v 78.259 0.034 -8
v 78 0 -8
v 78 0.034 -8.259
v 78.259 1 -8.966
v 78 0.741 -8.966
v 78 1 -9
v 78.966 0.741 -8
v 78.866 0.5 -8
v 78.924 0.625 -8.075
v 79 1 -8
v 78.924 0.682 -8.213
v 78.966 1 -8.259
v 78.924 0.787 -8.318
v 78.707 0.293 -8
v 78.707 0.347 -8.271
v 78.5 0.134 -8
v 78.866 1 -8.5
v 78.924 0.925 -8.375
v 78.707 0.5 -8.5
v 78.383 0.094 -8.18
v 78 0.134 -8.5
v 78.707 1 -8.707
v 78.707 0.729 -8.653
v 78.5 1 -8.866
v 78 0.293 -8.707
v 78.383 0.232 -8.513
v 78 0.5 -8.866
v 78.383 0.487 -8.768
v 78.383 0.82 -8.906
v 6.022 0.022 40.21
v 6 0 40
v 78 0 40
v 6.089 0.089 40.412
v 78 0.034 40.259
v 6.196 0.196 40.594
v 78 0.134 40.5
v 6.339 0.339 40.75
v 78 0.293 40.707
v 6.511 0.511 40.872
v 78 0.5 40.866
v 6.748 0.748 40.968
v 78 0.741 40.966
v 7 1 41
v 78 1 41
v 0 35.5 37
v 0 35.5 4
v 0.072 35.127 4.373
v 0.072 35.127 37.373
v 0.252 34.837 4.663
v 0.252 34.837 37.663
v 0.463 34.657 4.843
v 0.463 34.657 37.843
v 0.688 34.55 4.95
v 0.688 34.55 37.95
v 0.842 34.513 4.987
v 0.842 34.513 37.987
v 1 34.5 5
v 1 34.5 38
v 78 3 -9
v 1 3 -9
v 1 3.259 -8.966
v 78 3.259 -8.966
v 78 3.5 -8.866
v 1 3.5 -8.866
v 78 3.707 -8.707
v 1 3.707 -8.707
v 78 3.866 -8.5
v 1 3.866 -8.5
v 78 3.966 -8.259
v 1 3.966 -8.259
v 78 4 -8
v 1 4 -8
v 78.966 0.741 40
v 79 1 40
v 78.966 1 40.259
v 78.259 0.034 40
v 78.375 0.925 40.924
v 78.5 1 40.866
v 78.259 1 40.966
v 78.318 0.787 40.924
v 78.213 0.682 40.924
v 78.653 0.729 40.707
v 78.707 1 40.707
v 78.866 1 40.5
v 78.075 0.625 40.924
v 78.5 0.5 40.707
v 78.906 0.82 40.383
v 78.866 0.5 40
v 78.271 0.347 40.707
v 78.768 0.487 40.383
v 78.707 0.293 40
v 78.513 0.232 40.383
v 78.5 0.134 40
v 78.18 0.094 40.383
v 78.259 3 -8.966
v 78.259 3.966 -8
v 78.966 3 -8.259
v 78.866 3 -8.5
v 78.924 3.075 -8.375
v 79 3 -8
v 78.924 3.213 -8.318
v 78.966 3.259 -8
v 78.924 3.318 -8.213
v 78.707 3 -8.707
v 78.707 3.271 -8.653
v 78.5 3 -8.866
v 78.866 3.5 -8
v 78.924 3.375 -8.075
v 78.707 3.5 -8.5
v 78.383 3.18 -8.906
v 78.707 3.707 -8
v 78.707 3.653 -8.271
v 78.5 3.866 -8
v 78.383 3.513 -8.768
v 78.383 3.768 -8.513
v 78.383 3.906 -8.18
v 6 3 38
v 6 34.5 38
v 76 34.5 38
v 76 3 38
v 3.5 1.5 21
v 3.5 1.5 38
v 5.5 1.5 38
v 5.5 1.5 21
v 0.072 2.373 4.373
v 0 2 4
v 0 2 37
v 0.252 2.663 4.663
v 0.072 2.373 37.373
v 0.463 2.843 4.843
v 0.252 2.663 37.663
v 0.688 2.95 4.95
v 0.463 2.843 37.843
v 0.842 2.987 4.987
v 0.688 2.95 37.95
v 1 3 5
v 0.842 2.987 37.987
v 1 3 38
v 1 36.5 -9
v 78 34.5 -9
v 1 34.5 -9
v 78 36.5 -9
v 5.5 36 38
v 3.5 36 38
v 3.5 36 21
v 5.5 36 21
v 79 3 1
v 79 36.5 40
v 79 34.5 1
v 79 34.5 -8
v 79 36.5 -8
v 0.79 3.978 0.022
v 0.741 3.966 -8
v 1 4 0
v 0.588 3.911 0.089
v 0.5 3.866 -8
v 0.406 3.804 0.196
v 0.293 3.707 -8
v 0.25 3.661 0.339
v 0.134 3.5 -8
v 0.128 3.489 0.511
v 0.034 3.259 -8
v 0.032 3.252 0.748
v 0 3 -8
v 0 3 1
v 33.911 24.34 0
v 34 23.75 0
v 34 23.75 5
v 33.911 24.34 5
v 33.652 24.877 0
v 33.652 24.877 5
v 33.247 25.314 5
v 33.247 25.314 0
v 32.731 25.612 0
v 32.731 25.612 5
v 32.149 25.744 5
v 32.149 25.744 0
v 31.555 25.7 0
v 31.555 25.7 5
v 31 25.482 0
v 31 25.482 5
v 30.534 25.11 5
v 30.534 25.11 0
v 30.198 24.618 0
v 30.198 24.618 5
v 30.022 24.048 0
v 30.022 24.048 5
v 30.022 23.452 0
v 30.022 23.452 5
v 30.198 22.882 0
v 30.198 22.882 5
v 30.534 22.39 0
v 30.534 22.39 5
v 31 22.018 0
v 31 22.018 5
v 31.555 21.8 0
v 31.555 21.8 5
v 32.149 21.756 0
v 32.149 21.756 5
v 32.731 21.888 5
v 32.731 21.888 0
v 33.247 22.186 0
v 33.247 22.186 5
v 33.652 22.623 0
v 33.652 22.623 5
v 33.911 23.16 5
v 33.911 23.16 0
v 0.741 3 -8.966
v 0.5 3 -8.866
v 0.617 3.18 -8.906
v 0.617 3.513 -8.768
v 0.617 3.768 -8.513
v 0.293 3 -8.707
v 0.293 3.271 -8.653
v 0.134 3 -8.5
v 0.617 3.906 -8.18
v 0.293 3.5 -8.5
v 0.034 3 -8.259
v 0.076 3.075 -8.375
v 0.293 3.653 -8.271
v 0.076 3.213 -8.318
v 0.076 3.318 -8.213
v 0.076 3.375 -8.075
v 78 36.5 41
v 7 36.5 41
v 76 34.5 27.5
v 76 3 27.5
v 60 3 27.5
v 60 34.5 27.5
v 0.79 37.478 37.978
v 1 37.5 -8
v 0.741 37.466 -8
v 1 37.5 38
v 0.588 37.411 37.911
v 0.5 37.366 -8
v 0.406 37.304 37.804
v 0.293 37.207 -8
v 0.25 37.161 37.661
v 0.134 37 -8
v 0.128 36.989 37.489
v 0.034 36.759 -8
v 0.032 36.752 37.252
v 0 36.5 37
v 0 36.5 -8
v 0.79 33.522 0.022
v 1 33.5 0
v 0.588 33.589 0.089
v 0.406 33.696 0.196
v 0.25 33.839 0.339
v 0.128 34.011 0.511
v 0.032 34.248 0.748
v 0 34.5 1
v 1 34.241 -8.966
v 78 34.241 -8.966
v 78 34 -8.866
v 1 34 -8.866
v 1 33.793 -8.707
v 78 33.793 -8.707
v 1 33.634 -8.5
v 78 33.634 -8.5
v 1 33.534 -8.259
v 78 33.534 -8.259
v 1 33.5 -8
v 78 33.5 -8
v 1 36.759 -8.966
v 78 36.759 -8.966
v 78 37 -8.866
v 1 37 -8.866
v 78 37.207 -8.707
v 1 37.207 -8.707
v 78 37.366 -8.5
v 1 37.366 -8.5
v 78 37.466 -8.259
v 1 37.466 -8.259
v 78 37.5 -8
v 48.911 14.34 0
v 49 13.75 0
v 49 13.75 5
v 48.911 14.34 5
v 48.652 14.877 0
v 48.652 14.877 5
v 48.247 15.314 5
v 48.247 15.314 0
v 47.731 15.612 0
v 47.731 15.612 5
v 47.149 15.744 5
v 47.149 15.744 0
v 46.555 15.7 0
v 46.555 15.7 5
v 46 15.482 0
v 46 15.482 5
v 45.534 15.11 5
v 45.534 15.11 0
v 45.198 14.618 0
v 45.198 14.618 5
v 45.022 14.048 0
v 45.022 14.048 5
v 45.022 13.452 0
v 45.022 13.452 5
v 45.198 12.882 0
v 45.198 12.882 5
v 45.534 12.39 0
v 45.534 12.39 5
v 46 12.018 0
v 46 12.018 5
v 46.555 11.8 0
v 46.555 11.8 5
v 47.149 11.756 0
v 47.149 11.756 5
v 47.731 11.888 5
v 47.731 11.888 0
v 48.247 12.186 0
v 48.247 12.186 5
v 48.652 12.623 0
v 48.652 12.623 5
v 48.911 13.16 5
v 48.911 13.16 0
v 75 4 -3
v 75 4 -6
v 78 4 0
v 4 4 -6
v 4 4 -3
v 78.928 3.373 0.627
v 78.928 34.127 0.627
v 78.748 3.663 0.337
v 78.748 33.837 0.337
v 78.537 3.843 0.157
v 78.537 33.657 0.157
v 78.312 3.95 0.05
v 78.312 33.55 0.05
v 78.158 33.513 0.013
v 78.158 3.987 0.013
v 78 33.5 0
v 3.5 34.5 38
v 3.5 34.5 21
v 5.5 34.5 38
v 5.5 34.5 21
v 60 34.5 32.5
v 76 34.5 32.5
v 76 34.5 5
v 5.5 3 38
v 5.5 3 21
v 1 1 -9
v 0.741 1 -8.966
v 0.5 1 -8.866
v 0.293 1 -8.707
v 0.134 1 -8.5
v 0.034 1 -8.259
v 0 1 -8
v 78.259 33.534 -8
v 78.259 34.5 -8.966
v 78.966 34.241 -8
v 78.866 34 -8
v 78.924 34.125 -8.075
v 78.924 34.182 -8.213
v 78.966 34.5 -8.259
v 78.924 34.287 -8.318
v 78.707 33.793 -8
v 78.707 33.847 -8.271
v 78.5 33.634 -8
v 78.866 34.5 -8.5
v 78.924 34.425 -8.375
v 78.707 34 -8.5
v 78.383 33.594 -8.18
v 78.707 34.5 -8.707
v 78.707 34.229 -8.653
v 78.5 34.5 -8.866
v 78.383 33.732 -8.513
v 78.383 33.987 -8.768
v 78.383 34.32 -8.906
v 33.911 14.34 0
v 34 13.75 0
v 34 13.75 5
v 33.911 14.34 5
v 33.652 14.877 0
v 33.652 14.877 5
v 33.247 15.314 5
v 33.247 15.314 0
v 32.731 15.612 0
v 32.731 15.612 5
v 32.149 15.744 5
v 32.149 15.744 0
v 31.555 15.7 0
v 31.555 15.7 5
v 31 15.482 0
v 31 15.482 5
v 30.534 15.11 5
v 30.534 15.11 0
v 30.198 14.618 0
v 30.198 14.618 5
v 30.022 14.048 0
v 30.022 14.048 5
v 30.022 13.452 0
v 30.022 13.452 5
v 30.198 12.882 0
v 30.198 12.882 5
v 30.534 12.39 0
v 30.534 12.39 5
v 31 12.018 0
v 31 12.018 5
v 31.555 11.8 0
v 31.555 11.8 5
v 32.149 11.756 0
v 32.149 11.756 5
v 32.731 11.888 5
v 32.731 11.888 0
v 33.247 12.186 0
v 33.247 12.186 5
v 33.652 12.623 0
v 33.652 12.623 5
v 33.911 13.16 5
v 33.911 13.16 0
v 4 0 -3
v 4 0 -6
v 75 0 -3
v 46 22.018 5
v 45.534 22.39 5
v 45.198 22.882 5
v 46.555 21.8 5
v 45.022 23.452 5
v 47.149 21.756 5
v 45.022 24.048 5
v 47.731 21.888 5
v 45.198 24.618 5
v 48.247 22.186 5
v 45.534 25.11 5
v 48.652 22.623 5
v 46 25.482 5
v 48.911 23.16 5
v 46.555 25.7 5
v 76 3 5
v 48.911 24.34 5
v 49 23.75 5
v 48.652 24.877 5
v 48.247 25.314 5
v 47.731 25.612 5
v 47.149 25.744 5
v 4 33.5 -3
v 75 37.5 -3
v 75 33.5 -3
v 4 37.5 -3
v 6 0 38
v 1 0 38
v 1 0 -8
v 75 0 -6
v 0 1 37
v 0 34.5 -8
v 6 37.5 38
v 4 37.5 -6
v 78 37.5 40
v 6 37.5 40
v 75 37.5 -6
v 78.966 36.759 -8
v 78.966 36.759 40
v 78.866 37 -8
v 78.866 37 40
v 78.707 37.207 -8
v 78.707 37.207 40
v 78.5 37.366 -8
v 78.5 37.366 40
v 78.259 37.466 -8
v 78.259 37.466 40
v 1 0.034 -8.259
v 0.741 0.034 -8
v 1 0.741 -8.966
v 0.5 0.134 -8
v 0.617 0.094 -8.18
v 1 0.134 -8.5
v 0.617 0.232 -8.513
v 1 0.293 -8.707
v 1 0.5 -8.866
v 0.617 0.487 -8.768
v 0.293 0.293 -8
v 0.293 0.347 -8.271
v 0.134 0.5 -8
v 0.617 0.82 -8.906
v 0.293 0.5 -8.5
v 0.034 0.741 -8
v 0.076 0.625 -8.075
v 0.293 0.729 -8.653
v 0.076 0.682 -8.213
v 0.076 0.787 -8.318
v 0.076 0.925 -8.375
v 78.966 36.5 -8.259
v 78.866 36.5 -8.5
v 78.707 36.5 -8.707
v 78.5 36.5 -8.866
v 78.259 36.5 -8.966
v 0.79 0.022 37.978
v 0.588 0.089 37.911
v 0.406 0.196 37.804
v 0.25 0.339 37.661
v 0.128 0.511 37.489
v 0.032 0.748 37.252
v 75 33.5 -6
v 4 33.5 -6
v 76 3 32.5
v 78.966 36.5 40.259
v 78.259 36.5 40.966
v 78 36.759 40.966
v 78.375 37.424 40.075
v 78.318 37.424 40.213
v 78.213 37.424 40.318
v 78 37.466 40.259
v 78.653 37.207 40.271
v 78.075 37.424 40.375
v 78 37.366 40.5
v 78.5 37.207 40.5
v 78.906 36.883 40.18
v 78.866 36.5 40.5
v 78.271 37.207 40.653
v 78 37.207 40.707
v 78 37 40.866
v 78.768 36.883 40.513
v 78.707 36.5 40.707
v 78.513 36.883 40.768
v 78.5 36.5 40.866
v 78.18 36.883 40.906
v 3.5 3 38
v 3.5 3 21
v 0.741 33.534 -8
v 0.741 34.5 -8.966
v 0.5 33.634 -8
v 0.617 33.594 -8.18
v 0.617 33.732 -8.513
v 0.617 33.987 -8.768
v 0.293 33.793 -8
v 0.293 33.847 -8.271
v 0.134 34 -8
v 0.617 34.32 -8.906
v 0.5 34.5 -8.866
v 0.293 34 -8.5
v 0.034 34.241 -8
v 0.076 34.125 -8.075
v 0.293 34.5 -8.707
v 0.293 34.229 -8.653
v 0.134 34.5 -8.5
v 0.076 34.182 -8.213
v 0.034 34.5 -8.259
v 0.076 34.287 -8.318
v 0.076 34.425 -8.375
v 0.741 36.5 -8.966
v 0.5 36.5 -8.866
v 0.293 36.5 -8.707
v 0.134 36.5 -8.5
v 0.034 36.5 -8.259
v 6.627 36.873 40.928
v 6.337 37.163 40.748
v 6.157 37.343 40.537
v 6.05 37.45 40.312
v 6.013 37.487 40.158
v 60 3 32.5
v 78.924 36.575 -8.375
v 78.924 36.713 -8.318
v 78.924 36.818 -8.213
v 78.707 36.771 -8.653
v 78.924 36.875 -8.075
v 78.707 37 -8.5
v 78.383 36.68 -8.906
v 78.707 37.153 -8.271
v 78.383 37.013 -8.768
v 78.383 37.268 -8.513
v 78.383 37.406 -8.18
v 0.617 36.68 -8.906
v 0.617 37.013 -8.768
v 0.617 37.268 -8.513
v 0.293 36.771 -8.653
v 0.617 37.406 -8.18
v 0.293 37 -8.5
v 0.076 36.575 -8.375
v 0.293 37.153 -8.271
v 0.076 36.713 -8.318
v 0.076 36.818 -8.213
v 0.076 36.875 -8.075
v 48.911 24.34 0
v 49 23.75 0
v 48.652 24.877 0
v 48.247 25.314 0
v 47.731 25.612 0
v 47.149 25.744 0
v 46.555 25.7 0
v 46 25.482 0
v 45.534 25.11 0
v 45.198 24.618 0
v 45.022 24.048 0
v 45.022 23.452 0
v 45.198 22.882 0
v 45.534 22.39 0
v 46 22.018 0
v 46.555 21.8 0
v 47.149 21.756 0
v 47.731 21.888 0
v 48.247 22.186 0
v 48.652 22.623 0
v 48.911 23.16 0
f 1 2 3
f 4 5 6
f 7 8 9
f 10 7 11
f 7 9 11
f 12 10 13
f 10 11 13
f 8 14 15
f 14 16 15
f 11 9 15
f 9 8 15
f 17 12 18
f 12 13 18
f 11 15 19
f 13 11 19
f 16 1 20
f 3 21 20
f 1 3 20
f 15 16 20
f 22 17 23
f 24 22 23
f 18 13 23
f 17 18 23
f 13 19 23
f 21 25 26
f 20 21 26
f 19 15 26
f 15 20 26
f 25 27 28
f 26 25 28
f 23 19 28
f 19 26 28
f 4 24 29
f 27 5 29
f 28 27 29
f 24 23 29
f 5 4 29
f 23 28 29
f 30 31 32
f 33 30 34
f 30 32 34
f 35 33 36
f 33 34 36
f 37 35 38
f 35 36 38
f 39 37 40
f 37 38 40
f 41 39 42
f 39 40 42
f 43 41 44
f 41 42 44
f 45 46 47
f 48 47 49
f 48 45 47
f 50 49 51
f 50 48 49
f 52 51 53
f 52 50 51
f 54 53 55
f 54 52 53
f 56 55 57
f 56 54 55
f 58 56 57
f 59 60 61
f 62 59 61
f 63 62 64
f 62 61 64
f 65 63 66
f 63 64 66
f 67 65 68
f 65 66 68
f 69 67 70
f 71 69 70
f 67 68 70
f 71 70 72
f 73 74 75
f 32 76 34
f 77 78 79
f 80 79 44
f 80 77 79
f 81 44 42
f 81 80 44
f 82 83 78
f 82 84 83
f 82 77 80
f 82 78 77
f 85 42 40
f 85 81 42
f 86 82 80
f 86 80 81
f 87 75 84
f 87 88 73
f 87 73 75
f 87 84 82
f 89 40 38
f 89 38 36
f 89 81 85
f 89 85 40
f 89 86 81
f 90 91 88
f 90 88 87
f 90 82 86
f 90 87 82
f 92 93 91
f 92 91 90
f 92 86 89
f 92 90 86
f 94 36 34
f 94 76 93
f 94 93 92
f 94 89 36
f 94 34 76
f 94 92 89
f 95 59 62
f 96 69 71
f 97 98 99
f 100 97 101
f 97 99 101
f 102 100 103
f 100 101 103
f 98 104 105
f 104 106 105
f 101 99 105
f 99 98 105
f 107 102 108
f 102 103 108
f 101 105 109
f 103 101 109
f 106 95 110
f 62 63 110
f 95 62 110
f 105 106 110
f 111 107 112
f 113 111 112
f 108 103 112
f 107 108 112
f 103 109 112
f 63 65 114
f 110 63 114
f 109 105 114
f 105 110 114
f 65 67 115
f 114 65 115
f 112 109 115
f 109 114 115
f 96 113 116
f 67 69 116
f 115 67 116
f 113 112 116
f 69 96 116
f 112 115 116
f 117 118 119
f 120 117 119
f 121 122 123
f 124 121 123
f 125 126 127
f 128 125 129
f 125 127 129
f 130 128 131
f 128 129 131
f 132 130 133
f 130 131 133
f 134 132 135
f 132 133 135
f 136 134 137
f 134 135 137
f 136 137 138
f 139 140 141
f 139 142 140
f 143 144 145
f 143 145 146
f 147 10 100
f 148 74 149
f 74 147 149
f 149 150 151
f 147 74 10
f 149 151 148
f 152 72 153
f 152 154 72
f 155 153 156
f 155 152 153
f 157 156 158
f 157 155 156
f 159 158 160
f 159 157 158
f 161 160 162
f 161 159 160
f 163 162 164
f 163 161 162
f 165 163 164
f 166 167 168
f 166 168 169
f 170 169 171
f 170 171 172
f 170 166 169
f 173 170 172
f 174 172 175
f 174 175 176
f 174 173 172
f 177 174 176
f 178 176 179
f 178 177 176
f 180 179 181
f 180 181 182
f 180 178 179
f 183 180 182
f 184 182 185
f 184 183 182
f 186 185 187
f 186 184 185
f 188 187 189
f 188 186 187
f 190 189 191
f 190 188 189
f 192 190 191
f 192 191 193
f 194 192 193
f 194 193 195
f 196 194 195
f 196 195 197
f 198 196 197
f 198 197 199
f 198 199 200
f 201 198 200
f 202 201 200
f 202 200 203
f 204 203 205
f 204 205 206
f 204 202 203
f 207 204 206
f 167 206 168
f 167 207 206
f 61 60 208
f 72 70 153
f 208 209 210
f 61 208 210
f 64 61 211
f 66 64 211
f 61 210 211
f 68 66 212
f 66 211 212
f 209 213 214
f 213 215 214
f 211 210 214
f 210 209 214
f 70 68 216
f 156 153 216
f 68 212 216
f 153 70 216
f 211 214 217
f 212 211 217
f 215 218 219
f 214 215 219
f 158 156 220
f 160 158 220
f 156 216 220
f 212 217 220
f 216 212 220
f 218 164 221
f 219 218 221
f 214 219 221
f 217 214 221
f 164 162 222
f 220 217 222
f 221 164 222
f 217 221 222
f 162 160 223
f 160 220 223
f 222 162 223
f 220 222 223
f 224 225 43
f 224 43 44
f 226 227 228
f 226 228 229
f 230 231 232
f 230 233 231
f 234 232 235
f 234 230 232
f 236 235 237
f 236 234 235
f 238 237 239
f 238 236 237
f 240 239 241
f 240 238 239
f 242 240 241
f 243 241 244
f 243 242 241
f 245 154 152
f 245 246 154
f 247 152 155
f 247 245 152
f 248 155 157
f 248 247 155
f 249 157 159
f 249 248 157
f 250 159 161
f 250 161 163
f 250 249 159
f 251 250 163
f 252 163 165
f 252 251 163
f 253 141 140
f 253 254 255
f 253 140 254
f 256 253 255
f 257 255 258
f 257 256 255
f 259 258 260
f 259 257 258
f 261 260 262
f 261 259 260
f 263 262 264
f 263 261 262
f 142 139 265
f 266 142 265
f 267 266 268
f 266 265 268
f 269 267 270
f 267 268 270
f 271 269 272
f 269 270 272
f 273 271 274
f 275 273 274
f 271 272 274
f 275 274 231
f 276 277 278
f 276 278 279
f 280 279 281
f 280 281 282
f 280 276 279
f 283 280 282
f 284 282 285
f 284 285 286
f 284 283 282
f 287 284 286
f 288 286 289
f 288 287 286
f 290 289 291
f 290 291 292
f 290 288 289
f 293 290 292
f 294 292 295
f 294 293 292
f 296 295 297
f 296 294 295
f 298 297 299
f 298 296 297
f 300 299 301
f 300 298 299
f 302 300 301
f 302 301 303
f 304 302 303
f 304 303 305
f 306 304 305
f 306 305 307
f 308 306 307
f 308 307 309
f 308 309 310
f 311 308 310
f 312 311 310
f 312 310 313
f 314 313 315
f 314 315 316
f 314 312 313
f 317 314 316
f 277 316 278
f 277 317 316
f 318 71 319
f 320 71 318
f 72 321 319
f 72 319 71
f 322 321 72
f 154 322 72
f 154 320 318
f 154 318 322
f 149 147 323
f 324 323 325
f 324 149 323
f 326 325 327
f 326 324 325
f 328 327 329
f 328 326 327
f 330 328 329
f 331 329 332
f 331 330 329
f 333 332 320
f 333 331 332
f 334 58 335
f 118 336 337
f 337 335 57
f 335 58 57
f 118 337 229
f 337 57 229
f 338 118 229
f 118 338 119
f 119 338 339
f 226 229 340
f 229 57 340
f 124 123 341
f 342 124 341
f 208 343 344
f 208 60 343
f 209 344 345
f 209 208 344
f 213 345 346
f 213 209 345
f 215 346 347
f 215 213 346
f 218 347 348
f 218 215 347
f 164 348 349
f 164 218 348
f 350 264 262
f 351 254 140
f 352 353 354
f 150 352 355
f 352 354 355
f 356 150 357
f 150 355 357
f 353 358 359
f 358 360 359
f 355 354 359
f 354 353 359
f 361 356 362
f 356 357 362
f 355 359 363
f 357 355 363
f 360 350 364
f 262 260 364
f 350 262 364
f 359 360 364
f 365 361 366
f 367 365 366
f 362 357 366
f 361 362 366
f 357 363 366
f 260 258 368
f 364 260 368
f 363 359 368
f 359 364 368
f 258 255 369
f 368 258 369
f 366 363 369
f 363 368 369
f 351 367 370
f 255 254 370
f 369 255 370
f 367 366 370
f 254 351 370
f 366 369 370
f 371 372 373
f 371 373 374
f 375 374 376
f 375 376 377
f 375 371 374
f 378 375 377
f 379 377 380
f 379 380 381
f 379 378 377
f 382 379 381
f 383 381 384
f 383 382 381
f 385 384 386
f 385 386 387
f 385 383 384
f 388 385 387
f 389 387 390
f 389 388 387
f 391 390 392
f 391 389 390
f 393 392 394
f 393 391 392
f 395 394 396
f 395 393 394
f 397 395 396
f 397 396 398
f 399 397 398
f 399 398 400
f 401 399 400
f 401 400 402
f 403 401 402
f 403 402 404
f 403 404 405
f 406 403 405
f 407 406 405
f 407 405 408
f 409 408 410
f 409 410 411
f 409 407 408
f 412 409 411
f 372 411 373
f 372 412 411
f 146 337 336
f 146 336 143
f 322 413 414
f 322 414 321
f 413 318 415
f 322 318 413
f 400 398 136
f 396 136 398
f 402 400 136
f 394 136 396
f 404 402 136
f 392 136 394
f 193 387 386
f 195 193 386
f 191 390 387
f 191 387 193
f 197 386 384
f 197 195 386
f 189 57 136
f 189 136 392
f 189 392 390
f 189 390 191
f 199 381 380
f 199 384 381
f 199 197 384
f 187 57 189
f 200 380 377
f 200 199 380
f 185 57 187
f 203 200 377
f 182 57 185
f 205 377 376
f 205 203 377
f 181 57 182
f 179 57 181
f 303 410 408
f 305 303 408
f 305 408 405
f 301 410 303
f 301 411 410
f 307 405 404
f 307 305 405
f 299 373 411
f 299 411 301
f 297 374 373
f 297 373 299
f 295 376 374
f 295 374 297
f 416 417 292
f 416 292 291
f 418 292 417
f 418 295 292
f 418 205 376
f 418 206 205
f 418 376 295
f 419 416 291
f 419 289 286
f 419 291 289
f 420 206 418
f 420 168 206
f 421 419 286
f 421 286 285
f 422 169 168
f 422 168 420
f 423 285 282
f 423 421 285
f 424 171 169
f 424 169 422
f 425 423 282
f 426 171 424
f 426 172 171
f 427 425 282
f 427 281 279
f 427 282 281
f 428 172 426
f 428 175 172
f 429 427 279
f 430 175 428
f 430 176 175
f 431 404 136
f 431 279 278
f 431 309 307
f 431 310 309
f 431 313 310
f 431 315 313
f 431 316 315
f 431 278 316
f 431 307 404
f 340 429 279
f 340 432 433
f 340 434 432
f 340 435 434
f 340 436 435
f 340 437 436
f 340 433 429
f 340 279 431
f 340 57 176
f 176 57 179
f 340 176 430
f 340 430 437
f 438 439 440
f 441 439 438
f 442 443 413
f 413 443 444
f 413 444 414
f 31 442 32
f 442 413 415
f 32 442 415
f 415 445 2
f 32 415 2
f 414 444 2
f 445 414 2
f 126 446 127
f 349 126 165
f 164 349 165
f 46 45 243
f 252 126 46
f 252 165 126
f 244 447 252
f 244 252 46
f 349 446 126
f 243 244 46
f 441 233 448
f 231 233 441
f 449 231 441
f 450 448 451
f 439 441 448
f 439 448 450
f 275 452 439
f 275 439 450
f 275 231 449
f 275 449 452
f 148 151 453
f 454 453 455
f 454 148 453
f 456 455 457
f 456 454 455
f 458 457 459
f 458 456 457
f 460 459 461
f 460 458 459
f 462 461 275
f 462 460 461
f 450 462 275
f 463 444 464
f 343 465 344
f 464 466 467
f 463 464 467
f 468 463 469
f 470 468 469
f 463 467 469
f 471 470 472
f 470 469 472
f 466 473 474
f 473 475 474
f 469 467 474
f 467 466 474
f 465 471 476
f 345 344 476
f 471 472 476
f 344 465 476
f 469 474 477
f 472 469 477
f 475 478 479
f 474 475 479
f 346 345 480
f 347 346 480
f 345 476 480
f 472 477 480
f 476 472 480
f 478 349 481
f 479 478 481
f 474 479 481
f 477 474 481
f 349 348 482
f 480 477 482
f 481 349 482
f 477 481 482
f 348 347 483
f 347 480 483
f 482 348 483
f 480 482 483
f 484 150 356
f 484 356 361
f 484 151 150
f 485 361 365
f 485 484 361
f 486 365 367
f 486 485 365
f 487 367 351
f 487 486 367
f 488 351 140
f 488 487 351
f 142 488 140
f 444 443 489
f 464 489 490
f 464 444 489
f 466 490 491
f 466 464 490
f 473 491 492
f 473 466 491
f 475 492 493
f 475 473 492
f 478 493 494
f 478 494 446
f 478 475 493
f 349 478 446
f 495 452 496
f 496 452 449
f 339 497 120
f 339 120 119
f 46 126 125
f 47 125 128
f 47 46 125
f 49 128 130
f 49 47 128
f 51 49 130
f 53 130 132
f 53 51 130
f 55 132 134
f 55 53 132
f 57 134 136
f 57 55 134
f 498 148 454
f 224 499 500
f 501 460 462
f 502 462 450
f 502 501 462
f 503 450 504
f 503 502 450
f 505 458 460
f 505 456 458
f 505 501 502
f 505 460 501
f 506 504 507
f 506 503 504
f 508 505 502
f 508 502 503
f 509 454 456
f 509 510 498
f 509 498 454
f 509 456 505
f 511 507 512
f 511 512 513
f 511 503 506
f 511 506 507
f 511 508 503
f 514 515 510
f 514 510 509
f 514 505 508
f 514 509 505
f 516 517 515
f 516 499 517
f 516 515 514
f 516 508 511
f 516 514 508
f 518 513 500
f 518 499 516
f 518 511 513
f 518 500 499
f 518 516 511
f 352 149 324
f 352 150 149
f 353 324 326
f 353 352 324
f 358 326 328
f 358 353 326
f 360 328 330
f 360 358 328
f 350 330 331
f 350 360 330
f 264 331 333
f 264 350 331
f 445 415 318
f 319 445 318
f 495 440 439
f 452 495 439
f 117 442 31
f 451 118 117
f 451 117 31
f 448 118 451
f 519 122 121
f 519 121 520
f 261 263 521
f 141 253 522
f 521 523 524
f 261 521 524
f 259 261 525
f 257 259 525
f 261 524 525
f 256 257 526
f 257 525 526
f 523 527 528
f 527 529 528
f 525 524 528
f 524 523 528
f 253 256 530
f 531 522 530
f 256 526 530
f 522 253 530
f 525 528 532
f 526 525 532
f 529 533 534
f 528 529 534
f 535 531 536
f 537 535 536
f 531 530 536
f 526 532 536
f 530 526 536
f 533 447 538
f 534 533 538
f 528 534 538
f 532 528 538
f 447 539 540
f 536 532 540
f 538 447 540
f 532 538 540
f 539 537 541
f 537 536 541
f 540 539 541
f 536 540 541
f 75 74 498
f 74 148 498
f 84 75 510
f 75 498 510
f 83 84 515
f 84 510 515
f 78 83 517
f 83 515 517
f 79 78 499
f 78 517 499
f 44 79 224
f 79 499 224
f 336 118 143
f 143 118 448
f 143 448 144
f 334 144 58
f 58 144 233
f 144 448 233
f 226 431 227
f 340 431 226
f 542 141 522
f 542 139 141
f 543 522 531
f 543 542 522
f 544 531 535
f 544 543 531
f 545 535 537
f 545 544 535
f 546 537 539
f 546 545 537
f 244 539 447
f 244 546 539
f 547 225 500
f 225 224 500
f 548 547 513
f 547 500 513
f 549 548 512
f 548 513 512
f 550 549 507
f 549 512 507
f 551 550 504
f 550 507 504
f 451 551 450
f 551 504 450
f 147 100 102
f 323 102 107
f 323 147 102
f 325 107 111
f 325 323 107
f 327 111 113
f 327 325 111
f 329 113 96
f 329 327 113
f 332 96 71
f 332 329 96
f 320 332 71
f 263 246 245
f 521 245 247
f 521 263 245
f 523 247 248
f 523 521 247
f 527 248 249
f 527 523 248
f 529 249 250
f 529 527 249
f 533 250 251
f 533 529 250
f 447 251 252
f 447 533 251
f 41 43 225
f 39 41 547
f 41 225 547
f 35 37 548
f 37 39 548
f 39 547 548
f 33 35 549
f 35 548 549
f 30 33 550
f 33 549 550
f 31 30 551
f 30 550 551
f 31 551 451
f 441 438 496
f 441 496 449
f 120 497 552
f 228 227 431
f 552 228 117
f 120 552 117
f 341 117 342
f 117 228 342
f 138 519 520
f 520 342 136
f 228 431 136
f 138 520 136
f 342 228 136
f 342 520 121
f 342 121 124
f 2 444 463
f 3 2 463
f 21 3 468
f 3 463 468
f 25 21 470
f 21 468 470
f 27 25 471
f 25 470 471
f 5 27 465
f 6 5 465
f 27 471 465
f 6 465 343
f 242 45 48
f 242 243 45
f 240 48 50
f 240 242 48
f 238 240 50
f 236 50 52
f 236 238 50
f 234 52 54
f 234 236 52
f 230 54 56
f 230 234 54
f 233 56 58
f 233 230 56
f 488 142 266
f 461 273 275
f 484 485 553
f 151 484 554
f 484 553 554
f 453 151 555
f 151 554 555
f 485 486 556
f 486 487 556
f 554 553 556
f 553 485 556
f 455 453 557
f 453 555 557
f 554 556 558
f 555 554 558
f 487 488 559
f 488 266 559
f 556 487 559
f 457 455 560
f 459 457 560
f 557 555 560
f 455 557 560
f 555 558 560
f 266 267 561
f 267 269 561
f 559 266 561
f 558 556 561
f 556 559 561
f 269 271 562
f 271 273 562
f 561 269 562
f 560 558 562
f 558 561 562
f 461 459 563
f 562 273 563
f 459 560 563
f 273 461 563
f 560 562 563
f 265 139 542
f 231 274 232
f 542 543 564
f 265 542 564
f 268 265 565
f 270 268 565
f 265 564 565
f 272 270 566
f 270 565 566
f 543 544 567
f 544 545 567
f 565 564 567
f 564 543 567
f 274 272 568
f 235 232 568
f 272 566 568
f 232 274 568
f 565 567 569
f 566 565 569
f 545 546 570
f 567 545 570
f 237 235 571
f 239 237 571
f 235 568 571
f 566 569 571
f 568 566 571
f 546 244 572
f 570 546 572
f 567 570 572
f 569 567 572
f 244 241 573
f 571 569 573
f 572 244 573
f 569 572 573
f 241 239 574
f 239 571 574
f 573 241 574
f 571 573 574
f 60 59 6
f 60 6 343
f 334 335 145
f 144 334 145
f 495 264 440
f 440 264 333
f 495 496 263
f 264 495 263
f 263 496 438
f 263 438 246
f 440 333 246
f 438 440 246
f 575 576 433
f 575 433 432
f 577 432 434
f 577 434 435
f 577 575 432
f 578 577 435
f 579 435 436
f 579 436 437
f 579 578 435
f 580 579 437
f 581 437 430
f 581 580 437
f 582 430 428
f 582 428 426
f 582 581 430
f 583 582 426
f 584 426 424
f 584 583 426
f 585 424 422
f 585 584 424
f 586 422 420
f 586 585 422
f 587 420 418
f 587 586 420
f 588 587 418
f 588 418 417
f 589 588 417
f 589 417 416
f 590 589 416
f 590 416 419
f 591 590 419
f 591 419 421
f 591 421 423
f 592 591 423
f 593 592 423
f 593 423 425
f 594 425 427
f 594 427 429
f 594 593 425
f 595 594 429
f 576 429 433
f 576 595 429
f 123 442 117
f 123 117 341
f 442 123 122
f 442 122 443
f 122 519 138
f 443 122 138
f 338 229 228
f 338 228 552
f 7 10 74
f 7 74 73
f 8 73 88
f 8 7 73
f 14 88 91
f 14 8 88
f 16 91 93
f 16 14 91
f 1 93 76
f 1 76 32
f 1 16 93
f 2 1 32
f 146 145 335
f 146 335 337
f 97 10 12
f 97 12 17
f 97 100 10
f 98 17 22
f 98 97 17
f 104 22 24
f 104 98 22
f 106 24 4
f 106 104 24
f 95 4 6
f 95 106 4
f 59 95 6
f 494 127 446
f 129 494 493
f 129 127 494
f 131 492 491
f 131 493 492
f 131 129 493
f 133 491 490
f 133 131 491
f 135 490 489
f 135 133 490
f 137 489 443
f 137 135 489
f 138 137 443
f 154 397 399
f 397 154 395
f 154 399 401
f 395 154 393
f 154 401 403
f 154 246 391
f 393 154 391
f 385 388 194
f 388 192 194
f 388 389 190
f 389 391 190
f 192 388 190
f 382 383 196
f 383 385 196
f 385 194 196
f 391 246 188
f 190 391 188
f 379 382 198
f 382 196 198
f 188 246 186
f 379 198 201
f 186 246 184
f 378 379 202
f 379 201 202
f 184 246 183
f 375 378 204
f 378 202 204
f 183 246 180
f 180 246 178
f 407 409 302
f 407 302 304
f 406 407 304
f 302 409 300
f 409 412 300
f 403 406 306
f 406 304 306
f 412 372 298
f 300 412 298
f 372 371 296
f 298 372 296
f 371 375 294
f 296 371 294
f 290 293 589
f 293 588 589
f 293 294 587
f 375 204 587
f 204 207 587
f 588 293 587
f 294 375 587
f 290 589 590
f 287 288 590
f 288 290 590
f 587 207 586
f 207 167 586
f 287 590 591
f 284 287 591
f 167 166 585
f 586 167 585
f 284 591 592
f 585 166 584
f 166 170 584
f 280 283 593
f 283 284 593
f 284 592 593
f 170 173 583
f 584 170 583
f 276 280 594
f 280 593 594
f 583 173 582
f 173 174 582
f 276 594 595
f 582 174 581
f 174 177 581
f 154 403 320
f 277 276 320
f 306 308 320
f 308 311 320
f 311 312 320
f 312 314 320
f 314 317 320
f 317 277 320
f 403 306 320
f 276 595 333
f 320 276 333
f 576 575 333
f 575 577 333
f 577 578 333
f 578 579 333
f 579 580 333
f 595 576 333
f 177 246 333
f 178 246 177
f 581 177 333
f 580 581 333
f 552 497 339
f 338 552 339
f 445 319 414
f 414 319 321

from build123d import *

# Parameters (mm, degrees)
SKETCH1_W           = 79
SKETCH1_H           = 37.5
SKETCH1_R           = 2
BODY_DEPTH          = 5
SKETCH2_W           = 79
SKETCH2_H           = 4
LEG1_DEPTH          = 3
SKETCH3_W           = 4
SKETCH3_H           = 4
LEG2_DEPTH          = 3
SKETCH4_W           = 79
SKETCH4_H           = 4
LEG3_DEPTH          = 3
WALLS_DEPTH         = 33
SKETCH6_W           = 2
SKETCH6_H           = 34.5
CUT_EXTRUDE1_DEPTH  = 17
SKETCH7_W           = 73
SKETCH7_H           = 37.5
BOSS_EXTRUDE1_DEPTH = 3
FILLET1_R           = 1
FILLET2_R           = 1
FILLET3_R           = 1
FILLET4_R           = 1
FILLET6_R           = 1
SKETCH8_W           = 5
SKETCH8_H           = 31.5
BOSS_EXTRUDE2_DEPTH = 16


with BuildPart() as part:
    # Sketch1 → Body (new body)
    with BuildSketch(Plane.XY):
        with Locations((39.5, 18.75)):
            Rectangle(SKETCH1_W, SKETCH1_H)
        with Locations((47, 23.75)):
            Circle(SKETCH1_R, mode=Mode.SUBTRACT)
        with Locations((32, 23.75)):
            Circle(SKETCH1_R, mode=Mode.SUBTRACT)
        with Locations((32, 13.75)):
            Circle(SKETCH1_R, mode=Mode.SUBTRACT)
        with Locations((47, 13.75)):
            Circle(SKETCH1_R, mode=Mode.SUBTRACT)
    extrude(amount=BODY_DEPTH)

    # Sketch2 → Leg1 (add)
    with BuildSketch(Plane(origin=(0, 0, 0), x_dir=(-1, 0, 0), z_dir=(0, 0, -1))):
        with Locations((-39.5, 35.5)):
            Rectangle(SKETCH2_W, SKETCH2_H)
        with Locations((-39.5, 2)):
            Rectangle(SKETCH2_W, SKETCH2_H)
    extrude(amount=LEG1_DEPTH)

    # Sketch3 → Leg2 (add)
    with BuildSketch(Plane(origin=(0, 0, -3), x_dir=(-1, 0, 0), z_dir=(0, 0, -1))):
        with Locations((-77, 35.5)):
            Rectangle(SKETCH3_W, SKETCH3_H)
        with Locations((-2, 35.5)):
            Rectangle(SKETCH3_W, SKETCH3_H)
        with Locations((-2, 2)):
            Rectangle(SKETCH3_W, SKETCH3_H)
        with Locations((-77, 2)):
            Rectangle(SKETCH3_W, SKETCH3_H)
    extrude(amount=LEG2_DEPTH)

    # Sketch4 → Leg3 (add)
    with BuildSketch(Plane(origin=(0, 0, -6), x_dir=(-1, 0, 0), z_dir=(0, 0, -1))):
        with Locations((-39.5, 35.5)):
            Rectangle(SKETCH4_W, SKETCH4_H)
        with Locations((-39.5, 2)):
            Rectangle(SKETCH4_W, SKETCH4_H)
    extrude(amount=LEG3_DEPTH)

    # Sketch5 → Walls (add)
    with BuildSketch(Plane.XY.offset(5)):
        Polygon((0, 37.5), (79, 37.5), (79, 34.5), (79, 29.685442104), (79, 7.814557896), (79, 3), (79, 0), (0, 0), (0, 3), (3, 3), (76, 3), (76, 34.5), (3, 34.5), (0, 34.5), align=None)
    extrude(amount=WALLS_DEPTH)

    # Sketch6 → Cut-Extrude1 (cut)
    with BuildSketch(Plane.XY.offset(38)):
        with Locations((4.5, 18.75)):
            Rectangle(SKETCH6_W, SKETCH6_H)
    extrude(amount=-CUT_EXTRUDE1_DEPTH, mode=Mode.SUBTRACT)

    # Sketch7 → Boss-Extrude1 (add)
    with BuildSketch(Plane.XY.offset(38)):
        with Locations((42.5, 18.75)):
            Rectangle(SKETCH7_W, SKETCH7_H)
    extrude(amount=BOSS_EXTRUDE1_DEPTH)

    # Fillet1
    fillet1_edges = [part.edges().sort_by_distance(p)[0] for p in [
        (39.5, 37.5, -9),
    ]]
    fillet(fillet1_edges, radius=FILLET1_R)

    # Fillet2
    fillet2_edges = [part.edges().sort_by_distance(p)[0] for p in [
        (39.5, 33.5, -9),
    ]]
    fillet(fillet2_edges, radius=FILLET2_R)

    # Fillet3
    fillet3_edges = [part.edges().sort_by_distance(p)[0] for p in [
        (39.5, 0, -9),
    ]]
    fillet(fillet3_edges, radius=FILLET3_R)

    # Fillet4
    fillet4_edges = [part.edges().sort_by_distance(p)[0] for p in [
        (39.5, 4, -9),
    ]]
    fillet(fillet4_edges, radius=FILLET4_R)

    # Fillet6
    fillet6_edges = [part.edges().sort_by_distance(p)[0] for p in [
        (79, 2, -9),
        (79, 3.707106781, -8.707106781),
        (79, 0.292893219, -8.707106781),
        (79, 4, -4),
        (79, 0, 16.5),
        (79, 18.75, 0),
        (79, 18.75, 41),
        (79, 33.5, -4),
        (79, 37.5, 16.5),
        (79, 33.792893219, -8.707106781),
        (79, 37.207106781, -8.707106781),
        (79, 35.5, -9),
        (0, 2, -9),
        (0, 3.707106781, -8.707106781),
        (0, 0.292893219, -8.707106781),
        (0, 4, -4),
        (0, 0, 15),
        (42.5, 0, 41),
        (0, 18.75, 0),
        (42.5, 37.5, 41),
        (6, 18.75, 41),
        (0, 33.5, -4),
        (0, 37.5, 15),
        (0, 33.792893219, -8.707106781),
        (0, 37.207106781, -8.707106781),
        (0, 35.5, -9),
        (0, 1.5, 38),
        (0, 3, 21.5),
        (0, 18.75, 5),
        (0, 34.5, 21.5),
        (0, 36, 38),
    ]]
    fillet(fillet6_edges, radius=FILLET6_R)

    # Sketch8 → Boss-Extrude2 (add)
    with BuildSketch(Plane.ZY.offset(-76)):
        with Locations((30, 18.75)):
            Rectangle(SKETCH8_W, SKETCH8_H)
    extrude(amount=BOSS_EXTRUDE2_DEPTH)


solid = part.part
